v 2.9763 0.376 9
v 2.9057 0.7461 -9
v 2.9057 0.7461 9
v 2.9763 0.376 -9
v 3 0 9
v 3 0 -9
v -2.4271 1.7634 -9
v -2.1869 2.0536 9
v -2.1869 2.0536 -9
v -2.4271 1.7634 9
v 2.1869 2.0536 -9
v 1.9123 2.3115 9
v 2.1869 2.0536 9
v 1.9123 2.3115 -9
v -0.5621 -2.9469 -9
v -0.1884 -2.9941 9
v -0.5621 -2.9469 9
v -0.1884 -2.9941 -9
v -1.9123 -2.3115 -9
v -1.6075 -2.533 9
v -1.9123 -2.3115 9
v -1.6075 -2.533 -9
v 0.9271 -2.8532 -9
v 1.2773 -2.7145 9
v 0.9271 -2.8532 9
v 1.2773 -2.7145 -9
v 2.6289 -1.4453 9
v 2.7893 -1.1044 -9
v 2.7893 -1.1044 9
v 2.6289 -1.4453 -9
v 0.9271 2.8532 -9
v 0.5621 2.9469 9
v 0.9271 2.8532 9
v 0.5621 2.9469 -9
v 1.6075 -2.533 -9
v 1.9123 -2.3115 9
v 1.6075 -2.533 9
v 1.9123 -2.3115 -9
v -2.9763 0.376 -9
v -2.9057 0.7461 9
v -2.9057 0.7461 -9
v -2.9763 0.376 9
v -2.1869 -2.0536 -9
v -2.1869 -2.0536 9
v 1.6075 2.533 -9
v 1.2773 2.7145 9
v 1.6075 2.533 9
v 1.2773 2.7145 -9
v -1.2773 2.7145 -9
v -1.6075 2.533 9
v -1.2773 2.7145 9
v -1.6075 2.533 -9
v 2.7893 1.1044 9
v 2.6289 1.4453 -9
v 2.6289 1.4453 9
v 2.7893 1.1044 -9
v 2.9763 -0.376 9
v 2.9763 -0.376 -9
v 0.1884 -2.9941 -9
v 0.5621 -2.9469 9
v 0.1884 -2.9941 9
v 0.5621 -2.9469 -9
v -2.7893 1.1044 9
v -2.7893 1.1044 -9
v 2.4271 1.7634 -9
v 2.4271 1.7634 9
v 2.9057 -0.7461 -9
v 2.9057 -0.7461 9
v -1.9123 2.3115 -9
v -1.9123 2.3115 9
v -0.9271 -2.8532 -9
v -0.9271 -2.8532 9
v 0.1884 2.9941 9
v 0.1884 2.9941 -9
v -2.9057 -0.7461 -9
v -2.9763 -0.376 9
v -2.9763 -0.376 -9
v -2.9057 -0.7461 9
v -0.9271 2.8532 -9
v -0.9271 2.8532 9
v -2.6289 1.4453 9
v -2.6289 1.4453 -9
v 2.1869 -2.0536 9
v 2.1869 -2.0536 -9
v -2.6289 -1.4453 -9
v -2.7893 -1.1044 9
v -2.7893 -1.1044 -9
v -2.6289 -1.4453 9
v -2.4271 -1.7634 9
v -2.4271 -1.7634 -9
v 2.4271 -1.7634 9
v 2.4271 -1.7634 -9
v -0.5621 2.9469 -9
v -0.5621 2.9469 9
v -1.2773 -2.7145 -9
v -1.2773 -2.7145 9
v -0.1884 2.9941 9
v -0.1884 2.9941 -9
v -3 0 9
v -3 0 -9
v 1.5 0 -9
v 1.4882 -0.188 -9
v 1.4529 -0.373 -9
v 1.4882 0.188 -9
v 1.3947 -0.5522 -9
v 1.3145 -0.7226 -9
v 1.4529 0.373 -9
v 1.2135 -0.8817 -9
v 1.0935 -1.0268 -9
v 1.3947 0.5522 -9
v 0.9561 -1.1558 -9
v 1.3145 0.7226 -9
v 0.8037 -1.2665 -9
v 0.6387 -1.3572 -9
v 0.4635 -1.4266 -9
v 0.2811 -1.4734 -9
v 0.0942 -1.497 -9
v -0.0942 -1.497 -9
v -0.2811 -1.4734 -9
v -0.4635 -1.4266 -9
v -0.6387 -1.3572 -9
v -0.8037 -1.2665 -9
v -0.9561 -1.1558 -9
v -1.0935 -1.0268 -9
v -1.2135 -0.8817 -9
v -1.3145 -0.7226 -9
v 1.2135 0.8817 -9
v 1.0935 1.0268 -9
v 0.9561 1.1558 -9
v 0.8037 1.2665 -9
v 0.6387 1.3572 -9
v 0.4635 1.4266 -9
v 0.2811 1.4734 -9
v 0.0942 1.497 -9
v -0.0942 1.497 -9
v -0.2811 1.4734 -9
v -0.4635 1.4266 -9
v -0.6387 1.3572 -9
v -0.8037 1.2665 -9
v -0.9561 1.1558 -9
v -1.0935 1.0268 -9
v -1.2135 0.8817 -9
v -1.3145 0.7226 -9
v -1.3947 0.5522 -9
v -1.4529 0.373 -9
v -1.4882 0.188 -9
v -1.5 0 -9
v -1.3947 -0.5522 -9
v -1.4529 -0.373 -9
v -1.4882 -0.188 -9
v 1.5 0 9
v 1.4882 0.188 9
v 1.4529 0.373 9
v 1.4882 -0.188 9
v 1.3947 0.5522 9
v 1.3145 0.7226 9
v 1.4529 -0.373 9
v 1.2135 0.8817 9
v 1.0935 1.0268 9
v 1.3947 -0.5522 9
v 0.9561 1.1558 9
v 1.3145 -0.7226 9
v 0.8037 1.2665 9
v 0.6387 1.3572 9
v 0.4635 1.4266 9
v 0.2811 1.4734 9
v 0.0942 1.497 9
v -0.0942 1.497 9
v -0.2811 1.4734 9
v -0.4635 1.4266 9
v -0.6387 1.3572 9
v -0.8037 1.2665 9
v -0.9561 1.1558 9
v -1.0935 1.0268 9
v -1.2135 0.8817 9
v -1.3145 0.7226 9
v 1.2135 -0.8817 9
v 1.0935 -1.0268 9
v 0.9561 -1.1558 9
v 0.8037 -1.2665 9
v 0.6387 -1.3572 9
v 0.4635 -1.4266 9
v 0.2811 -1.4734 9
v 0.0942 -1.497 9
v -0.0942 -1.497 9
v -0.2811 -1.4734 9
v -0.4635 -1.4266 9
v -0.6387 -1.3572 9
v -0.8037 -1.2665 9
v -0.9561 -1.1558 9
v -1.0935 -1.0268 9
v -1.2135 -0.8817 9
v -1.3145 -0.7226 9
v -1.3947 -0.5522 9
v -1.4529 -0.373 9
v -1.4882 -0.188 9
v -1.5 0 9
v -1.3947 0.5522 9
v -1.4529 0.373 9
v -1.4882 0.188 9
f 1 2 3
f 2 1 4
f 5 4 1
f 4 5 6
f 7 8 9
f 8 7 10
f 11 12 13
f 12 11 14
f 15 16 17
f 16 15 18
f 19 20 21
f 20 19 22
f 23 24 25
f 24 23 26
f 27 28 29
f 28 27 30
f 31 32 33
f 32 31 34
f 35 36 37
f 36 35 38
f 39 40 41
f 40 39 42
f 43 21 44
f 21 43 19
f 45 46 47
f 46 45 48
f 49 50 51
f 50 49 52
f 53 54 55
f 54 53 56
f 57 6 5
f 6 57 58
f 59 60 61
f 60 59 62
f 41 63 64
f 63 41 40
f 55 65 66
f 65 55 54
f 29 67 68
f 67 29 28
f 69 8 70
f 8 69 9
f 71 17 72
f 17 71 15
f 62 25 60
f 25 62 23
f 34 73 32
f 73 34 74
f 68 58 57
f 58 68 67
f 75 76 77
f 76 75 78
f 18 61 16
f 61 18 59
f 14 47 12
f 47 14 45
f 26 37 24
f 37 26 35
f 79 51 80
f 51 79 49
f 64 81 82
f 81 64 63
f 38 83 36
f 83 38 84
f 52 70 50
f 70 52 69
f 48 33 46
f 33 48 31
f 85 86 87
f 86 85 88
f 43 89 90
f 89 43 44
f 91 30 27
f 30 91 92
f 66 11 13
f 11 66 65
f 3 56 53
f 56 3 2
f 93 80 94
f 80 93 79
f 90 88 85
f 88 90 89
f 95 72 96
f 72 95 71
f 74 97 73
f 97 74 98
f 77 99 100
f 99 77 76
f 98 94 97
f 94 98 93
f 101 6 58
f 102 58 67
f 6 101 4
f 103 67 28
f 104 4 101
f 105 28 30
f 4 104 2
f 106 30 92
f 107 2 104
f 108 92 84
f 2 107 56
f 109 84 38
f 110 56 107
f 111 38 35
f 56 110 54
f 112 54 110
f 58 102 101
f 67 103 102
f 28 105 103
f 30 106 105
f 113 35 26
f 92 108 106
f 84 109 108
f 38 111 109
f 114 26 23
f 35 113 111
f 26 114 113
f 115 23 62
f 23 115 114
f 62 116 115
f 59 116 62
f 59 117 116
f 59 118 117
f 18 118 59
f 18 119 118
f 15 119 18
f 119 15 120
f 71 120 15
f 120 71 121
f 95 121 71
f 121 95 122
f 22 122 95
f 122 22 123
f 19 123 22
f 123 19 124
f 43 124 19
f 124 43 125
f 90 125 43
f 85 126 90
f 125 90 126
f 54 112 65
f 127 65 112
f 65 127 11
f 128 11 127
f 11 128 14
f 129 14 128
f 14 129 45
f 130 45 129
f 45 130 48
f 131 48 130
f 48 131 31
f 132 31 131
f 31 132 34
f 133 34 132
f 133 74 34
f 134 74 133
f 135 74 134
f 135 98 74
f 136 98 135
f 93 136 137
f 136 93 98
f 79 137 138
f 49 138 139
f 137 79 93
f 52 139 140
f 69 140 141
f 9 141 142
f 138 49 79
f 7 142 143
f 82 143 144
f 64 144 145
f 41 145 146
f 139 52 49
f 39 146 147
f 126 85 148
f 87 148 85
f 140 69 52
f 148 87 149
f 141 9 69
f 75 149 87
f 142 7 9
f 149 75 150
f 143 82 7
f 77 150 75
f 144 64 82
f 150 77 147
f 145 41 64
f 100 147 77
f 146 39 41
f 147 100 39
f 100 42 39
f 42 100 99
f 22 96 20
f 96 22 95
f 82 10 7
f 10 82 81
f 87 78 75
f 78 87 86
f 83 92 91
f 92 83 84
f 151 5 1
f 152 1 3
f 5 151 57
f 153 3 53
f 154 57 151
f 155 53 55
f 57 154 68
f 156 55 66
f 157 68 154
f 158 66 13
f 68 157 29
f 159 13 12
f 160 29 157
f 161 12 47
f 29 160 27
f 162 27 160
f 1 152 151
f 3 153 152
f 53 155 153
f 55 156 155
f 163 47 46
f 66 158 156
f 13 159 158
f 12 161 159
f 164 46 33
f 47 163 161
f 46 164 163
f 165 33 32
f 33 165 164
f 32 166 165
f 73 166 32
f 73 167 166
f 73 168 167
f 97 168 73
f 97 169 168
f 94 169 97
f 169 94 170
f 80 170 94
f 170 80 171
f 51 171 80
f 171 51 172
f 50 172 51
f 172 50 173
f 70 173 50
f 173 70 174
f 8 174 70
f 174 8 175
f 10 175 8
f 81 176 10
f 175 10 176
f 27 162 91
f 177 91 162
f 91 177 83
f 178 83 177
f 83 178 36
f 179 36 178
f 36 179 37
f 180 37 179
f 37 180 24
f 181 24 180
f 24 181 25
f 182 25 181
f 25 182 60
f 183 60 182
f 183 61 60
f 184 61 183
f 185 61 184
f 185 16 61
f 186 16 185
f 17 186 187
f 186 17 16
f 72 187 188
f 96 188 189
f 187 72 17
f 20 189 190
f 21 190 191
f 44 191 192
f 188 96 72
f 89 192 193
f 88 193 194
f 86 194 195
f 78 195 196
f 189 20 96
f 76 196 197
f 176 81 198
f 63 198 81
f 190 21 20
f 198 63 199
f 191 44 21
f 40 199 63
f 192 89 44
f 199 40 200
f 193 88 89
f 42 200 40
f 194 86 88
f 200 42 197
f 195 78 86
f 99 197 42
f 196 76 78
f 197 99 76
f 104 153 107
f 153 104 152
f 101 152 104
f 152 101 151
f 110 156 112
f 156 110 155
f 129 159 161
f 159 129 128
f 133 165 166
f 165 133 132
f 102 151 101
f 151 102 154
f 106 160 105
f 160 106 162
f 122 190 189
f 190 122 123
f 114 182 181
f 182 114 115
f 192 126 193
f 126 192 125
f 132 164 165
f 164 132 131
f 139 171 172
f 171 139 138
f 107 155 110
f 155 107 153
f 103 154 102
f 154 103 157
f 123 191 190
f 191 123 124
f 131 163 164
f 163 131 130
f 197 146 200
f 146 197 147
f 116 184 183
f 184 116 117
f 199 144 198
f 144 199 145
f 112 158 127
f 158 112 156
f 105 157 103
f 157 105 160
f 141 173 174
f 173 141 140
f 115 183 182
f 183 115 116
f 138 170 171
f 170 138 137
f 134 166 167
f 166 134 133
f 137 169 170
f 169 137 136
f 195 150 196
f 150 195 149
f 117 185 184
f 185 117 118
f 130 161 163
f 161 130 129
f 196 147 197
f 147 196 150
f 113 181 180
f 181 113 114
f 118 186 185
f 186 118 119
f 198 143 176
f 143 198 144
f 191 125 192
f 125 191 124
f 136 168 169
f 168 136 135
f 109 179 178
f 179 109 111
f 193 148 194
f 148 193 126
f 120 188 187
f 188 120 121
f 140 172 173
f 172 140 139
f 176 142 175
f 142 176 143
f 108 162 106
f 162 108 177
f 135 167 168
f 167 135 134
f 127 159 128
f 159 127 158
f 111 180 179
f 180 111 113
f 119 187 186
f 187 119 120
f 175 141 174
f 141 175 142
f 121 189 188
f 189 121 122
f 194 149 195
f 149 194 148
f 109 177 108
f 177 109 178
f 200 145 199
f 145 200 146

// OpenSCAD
$fn = 50;


difference() {
	union() {
		translate(v = [0, 0, -9.0000000000]) {
			cylinder(h = 18, r = 3.0000000000);
		}
	}
	union() {
		translate(v = [0, 0, -100.0000000000]) {
			cylinder(h = 200, r = 1.5000000000);
		}
	}
}
